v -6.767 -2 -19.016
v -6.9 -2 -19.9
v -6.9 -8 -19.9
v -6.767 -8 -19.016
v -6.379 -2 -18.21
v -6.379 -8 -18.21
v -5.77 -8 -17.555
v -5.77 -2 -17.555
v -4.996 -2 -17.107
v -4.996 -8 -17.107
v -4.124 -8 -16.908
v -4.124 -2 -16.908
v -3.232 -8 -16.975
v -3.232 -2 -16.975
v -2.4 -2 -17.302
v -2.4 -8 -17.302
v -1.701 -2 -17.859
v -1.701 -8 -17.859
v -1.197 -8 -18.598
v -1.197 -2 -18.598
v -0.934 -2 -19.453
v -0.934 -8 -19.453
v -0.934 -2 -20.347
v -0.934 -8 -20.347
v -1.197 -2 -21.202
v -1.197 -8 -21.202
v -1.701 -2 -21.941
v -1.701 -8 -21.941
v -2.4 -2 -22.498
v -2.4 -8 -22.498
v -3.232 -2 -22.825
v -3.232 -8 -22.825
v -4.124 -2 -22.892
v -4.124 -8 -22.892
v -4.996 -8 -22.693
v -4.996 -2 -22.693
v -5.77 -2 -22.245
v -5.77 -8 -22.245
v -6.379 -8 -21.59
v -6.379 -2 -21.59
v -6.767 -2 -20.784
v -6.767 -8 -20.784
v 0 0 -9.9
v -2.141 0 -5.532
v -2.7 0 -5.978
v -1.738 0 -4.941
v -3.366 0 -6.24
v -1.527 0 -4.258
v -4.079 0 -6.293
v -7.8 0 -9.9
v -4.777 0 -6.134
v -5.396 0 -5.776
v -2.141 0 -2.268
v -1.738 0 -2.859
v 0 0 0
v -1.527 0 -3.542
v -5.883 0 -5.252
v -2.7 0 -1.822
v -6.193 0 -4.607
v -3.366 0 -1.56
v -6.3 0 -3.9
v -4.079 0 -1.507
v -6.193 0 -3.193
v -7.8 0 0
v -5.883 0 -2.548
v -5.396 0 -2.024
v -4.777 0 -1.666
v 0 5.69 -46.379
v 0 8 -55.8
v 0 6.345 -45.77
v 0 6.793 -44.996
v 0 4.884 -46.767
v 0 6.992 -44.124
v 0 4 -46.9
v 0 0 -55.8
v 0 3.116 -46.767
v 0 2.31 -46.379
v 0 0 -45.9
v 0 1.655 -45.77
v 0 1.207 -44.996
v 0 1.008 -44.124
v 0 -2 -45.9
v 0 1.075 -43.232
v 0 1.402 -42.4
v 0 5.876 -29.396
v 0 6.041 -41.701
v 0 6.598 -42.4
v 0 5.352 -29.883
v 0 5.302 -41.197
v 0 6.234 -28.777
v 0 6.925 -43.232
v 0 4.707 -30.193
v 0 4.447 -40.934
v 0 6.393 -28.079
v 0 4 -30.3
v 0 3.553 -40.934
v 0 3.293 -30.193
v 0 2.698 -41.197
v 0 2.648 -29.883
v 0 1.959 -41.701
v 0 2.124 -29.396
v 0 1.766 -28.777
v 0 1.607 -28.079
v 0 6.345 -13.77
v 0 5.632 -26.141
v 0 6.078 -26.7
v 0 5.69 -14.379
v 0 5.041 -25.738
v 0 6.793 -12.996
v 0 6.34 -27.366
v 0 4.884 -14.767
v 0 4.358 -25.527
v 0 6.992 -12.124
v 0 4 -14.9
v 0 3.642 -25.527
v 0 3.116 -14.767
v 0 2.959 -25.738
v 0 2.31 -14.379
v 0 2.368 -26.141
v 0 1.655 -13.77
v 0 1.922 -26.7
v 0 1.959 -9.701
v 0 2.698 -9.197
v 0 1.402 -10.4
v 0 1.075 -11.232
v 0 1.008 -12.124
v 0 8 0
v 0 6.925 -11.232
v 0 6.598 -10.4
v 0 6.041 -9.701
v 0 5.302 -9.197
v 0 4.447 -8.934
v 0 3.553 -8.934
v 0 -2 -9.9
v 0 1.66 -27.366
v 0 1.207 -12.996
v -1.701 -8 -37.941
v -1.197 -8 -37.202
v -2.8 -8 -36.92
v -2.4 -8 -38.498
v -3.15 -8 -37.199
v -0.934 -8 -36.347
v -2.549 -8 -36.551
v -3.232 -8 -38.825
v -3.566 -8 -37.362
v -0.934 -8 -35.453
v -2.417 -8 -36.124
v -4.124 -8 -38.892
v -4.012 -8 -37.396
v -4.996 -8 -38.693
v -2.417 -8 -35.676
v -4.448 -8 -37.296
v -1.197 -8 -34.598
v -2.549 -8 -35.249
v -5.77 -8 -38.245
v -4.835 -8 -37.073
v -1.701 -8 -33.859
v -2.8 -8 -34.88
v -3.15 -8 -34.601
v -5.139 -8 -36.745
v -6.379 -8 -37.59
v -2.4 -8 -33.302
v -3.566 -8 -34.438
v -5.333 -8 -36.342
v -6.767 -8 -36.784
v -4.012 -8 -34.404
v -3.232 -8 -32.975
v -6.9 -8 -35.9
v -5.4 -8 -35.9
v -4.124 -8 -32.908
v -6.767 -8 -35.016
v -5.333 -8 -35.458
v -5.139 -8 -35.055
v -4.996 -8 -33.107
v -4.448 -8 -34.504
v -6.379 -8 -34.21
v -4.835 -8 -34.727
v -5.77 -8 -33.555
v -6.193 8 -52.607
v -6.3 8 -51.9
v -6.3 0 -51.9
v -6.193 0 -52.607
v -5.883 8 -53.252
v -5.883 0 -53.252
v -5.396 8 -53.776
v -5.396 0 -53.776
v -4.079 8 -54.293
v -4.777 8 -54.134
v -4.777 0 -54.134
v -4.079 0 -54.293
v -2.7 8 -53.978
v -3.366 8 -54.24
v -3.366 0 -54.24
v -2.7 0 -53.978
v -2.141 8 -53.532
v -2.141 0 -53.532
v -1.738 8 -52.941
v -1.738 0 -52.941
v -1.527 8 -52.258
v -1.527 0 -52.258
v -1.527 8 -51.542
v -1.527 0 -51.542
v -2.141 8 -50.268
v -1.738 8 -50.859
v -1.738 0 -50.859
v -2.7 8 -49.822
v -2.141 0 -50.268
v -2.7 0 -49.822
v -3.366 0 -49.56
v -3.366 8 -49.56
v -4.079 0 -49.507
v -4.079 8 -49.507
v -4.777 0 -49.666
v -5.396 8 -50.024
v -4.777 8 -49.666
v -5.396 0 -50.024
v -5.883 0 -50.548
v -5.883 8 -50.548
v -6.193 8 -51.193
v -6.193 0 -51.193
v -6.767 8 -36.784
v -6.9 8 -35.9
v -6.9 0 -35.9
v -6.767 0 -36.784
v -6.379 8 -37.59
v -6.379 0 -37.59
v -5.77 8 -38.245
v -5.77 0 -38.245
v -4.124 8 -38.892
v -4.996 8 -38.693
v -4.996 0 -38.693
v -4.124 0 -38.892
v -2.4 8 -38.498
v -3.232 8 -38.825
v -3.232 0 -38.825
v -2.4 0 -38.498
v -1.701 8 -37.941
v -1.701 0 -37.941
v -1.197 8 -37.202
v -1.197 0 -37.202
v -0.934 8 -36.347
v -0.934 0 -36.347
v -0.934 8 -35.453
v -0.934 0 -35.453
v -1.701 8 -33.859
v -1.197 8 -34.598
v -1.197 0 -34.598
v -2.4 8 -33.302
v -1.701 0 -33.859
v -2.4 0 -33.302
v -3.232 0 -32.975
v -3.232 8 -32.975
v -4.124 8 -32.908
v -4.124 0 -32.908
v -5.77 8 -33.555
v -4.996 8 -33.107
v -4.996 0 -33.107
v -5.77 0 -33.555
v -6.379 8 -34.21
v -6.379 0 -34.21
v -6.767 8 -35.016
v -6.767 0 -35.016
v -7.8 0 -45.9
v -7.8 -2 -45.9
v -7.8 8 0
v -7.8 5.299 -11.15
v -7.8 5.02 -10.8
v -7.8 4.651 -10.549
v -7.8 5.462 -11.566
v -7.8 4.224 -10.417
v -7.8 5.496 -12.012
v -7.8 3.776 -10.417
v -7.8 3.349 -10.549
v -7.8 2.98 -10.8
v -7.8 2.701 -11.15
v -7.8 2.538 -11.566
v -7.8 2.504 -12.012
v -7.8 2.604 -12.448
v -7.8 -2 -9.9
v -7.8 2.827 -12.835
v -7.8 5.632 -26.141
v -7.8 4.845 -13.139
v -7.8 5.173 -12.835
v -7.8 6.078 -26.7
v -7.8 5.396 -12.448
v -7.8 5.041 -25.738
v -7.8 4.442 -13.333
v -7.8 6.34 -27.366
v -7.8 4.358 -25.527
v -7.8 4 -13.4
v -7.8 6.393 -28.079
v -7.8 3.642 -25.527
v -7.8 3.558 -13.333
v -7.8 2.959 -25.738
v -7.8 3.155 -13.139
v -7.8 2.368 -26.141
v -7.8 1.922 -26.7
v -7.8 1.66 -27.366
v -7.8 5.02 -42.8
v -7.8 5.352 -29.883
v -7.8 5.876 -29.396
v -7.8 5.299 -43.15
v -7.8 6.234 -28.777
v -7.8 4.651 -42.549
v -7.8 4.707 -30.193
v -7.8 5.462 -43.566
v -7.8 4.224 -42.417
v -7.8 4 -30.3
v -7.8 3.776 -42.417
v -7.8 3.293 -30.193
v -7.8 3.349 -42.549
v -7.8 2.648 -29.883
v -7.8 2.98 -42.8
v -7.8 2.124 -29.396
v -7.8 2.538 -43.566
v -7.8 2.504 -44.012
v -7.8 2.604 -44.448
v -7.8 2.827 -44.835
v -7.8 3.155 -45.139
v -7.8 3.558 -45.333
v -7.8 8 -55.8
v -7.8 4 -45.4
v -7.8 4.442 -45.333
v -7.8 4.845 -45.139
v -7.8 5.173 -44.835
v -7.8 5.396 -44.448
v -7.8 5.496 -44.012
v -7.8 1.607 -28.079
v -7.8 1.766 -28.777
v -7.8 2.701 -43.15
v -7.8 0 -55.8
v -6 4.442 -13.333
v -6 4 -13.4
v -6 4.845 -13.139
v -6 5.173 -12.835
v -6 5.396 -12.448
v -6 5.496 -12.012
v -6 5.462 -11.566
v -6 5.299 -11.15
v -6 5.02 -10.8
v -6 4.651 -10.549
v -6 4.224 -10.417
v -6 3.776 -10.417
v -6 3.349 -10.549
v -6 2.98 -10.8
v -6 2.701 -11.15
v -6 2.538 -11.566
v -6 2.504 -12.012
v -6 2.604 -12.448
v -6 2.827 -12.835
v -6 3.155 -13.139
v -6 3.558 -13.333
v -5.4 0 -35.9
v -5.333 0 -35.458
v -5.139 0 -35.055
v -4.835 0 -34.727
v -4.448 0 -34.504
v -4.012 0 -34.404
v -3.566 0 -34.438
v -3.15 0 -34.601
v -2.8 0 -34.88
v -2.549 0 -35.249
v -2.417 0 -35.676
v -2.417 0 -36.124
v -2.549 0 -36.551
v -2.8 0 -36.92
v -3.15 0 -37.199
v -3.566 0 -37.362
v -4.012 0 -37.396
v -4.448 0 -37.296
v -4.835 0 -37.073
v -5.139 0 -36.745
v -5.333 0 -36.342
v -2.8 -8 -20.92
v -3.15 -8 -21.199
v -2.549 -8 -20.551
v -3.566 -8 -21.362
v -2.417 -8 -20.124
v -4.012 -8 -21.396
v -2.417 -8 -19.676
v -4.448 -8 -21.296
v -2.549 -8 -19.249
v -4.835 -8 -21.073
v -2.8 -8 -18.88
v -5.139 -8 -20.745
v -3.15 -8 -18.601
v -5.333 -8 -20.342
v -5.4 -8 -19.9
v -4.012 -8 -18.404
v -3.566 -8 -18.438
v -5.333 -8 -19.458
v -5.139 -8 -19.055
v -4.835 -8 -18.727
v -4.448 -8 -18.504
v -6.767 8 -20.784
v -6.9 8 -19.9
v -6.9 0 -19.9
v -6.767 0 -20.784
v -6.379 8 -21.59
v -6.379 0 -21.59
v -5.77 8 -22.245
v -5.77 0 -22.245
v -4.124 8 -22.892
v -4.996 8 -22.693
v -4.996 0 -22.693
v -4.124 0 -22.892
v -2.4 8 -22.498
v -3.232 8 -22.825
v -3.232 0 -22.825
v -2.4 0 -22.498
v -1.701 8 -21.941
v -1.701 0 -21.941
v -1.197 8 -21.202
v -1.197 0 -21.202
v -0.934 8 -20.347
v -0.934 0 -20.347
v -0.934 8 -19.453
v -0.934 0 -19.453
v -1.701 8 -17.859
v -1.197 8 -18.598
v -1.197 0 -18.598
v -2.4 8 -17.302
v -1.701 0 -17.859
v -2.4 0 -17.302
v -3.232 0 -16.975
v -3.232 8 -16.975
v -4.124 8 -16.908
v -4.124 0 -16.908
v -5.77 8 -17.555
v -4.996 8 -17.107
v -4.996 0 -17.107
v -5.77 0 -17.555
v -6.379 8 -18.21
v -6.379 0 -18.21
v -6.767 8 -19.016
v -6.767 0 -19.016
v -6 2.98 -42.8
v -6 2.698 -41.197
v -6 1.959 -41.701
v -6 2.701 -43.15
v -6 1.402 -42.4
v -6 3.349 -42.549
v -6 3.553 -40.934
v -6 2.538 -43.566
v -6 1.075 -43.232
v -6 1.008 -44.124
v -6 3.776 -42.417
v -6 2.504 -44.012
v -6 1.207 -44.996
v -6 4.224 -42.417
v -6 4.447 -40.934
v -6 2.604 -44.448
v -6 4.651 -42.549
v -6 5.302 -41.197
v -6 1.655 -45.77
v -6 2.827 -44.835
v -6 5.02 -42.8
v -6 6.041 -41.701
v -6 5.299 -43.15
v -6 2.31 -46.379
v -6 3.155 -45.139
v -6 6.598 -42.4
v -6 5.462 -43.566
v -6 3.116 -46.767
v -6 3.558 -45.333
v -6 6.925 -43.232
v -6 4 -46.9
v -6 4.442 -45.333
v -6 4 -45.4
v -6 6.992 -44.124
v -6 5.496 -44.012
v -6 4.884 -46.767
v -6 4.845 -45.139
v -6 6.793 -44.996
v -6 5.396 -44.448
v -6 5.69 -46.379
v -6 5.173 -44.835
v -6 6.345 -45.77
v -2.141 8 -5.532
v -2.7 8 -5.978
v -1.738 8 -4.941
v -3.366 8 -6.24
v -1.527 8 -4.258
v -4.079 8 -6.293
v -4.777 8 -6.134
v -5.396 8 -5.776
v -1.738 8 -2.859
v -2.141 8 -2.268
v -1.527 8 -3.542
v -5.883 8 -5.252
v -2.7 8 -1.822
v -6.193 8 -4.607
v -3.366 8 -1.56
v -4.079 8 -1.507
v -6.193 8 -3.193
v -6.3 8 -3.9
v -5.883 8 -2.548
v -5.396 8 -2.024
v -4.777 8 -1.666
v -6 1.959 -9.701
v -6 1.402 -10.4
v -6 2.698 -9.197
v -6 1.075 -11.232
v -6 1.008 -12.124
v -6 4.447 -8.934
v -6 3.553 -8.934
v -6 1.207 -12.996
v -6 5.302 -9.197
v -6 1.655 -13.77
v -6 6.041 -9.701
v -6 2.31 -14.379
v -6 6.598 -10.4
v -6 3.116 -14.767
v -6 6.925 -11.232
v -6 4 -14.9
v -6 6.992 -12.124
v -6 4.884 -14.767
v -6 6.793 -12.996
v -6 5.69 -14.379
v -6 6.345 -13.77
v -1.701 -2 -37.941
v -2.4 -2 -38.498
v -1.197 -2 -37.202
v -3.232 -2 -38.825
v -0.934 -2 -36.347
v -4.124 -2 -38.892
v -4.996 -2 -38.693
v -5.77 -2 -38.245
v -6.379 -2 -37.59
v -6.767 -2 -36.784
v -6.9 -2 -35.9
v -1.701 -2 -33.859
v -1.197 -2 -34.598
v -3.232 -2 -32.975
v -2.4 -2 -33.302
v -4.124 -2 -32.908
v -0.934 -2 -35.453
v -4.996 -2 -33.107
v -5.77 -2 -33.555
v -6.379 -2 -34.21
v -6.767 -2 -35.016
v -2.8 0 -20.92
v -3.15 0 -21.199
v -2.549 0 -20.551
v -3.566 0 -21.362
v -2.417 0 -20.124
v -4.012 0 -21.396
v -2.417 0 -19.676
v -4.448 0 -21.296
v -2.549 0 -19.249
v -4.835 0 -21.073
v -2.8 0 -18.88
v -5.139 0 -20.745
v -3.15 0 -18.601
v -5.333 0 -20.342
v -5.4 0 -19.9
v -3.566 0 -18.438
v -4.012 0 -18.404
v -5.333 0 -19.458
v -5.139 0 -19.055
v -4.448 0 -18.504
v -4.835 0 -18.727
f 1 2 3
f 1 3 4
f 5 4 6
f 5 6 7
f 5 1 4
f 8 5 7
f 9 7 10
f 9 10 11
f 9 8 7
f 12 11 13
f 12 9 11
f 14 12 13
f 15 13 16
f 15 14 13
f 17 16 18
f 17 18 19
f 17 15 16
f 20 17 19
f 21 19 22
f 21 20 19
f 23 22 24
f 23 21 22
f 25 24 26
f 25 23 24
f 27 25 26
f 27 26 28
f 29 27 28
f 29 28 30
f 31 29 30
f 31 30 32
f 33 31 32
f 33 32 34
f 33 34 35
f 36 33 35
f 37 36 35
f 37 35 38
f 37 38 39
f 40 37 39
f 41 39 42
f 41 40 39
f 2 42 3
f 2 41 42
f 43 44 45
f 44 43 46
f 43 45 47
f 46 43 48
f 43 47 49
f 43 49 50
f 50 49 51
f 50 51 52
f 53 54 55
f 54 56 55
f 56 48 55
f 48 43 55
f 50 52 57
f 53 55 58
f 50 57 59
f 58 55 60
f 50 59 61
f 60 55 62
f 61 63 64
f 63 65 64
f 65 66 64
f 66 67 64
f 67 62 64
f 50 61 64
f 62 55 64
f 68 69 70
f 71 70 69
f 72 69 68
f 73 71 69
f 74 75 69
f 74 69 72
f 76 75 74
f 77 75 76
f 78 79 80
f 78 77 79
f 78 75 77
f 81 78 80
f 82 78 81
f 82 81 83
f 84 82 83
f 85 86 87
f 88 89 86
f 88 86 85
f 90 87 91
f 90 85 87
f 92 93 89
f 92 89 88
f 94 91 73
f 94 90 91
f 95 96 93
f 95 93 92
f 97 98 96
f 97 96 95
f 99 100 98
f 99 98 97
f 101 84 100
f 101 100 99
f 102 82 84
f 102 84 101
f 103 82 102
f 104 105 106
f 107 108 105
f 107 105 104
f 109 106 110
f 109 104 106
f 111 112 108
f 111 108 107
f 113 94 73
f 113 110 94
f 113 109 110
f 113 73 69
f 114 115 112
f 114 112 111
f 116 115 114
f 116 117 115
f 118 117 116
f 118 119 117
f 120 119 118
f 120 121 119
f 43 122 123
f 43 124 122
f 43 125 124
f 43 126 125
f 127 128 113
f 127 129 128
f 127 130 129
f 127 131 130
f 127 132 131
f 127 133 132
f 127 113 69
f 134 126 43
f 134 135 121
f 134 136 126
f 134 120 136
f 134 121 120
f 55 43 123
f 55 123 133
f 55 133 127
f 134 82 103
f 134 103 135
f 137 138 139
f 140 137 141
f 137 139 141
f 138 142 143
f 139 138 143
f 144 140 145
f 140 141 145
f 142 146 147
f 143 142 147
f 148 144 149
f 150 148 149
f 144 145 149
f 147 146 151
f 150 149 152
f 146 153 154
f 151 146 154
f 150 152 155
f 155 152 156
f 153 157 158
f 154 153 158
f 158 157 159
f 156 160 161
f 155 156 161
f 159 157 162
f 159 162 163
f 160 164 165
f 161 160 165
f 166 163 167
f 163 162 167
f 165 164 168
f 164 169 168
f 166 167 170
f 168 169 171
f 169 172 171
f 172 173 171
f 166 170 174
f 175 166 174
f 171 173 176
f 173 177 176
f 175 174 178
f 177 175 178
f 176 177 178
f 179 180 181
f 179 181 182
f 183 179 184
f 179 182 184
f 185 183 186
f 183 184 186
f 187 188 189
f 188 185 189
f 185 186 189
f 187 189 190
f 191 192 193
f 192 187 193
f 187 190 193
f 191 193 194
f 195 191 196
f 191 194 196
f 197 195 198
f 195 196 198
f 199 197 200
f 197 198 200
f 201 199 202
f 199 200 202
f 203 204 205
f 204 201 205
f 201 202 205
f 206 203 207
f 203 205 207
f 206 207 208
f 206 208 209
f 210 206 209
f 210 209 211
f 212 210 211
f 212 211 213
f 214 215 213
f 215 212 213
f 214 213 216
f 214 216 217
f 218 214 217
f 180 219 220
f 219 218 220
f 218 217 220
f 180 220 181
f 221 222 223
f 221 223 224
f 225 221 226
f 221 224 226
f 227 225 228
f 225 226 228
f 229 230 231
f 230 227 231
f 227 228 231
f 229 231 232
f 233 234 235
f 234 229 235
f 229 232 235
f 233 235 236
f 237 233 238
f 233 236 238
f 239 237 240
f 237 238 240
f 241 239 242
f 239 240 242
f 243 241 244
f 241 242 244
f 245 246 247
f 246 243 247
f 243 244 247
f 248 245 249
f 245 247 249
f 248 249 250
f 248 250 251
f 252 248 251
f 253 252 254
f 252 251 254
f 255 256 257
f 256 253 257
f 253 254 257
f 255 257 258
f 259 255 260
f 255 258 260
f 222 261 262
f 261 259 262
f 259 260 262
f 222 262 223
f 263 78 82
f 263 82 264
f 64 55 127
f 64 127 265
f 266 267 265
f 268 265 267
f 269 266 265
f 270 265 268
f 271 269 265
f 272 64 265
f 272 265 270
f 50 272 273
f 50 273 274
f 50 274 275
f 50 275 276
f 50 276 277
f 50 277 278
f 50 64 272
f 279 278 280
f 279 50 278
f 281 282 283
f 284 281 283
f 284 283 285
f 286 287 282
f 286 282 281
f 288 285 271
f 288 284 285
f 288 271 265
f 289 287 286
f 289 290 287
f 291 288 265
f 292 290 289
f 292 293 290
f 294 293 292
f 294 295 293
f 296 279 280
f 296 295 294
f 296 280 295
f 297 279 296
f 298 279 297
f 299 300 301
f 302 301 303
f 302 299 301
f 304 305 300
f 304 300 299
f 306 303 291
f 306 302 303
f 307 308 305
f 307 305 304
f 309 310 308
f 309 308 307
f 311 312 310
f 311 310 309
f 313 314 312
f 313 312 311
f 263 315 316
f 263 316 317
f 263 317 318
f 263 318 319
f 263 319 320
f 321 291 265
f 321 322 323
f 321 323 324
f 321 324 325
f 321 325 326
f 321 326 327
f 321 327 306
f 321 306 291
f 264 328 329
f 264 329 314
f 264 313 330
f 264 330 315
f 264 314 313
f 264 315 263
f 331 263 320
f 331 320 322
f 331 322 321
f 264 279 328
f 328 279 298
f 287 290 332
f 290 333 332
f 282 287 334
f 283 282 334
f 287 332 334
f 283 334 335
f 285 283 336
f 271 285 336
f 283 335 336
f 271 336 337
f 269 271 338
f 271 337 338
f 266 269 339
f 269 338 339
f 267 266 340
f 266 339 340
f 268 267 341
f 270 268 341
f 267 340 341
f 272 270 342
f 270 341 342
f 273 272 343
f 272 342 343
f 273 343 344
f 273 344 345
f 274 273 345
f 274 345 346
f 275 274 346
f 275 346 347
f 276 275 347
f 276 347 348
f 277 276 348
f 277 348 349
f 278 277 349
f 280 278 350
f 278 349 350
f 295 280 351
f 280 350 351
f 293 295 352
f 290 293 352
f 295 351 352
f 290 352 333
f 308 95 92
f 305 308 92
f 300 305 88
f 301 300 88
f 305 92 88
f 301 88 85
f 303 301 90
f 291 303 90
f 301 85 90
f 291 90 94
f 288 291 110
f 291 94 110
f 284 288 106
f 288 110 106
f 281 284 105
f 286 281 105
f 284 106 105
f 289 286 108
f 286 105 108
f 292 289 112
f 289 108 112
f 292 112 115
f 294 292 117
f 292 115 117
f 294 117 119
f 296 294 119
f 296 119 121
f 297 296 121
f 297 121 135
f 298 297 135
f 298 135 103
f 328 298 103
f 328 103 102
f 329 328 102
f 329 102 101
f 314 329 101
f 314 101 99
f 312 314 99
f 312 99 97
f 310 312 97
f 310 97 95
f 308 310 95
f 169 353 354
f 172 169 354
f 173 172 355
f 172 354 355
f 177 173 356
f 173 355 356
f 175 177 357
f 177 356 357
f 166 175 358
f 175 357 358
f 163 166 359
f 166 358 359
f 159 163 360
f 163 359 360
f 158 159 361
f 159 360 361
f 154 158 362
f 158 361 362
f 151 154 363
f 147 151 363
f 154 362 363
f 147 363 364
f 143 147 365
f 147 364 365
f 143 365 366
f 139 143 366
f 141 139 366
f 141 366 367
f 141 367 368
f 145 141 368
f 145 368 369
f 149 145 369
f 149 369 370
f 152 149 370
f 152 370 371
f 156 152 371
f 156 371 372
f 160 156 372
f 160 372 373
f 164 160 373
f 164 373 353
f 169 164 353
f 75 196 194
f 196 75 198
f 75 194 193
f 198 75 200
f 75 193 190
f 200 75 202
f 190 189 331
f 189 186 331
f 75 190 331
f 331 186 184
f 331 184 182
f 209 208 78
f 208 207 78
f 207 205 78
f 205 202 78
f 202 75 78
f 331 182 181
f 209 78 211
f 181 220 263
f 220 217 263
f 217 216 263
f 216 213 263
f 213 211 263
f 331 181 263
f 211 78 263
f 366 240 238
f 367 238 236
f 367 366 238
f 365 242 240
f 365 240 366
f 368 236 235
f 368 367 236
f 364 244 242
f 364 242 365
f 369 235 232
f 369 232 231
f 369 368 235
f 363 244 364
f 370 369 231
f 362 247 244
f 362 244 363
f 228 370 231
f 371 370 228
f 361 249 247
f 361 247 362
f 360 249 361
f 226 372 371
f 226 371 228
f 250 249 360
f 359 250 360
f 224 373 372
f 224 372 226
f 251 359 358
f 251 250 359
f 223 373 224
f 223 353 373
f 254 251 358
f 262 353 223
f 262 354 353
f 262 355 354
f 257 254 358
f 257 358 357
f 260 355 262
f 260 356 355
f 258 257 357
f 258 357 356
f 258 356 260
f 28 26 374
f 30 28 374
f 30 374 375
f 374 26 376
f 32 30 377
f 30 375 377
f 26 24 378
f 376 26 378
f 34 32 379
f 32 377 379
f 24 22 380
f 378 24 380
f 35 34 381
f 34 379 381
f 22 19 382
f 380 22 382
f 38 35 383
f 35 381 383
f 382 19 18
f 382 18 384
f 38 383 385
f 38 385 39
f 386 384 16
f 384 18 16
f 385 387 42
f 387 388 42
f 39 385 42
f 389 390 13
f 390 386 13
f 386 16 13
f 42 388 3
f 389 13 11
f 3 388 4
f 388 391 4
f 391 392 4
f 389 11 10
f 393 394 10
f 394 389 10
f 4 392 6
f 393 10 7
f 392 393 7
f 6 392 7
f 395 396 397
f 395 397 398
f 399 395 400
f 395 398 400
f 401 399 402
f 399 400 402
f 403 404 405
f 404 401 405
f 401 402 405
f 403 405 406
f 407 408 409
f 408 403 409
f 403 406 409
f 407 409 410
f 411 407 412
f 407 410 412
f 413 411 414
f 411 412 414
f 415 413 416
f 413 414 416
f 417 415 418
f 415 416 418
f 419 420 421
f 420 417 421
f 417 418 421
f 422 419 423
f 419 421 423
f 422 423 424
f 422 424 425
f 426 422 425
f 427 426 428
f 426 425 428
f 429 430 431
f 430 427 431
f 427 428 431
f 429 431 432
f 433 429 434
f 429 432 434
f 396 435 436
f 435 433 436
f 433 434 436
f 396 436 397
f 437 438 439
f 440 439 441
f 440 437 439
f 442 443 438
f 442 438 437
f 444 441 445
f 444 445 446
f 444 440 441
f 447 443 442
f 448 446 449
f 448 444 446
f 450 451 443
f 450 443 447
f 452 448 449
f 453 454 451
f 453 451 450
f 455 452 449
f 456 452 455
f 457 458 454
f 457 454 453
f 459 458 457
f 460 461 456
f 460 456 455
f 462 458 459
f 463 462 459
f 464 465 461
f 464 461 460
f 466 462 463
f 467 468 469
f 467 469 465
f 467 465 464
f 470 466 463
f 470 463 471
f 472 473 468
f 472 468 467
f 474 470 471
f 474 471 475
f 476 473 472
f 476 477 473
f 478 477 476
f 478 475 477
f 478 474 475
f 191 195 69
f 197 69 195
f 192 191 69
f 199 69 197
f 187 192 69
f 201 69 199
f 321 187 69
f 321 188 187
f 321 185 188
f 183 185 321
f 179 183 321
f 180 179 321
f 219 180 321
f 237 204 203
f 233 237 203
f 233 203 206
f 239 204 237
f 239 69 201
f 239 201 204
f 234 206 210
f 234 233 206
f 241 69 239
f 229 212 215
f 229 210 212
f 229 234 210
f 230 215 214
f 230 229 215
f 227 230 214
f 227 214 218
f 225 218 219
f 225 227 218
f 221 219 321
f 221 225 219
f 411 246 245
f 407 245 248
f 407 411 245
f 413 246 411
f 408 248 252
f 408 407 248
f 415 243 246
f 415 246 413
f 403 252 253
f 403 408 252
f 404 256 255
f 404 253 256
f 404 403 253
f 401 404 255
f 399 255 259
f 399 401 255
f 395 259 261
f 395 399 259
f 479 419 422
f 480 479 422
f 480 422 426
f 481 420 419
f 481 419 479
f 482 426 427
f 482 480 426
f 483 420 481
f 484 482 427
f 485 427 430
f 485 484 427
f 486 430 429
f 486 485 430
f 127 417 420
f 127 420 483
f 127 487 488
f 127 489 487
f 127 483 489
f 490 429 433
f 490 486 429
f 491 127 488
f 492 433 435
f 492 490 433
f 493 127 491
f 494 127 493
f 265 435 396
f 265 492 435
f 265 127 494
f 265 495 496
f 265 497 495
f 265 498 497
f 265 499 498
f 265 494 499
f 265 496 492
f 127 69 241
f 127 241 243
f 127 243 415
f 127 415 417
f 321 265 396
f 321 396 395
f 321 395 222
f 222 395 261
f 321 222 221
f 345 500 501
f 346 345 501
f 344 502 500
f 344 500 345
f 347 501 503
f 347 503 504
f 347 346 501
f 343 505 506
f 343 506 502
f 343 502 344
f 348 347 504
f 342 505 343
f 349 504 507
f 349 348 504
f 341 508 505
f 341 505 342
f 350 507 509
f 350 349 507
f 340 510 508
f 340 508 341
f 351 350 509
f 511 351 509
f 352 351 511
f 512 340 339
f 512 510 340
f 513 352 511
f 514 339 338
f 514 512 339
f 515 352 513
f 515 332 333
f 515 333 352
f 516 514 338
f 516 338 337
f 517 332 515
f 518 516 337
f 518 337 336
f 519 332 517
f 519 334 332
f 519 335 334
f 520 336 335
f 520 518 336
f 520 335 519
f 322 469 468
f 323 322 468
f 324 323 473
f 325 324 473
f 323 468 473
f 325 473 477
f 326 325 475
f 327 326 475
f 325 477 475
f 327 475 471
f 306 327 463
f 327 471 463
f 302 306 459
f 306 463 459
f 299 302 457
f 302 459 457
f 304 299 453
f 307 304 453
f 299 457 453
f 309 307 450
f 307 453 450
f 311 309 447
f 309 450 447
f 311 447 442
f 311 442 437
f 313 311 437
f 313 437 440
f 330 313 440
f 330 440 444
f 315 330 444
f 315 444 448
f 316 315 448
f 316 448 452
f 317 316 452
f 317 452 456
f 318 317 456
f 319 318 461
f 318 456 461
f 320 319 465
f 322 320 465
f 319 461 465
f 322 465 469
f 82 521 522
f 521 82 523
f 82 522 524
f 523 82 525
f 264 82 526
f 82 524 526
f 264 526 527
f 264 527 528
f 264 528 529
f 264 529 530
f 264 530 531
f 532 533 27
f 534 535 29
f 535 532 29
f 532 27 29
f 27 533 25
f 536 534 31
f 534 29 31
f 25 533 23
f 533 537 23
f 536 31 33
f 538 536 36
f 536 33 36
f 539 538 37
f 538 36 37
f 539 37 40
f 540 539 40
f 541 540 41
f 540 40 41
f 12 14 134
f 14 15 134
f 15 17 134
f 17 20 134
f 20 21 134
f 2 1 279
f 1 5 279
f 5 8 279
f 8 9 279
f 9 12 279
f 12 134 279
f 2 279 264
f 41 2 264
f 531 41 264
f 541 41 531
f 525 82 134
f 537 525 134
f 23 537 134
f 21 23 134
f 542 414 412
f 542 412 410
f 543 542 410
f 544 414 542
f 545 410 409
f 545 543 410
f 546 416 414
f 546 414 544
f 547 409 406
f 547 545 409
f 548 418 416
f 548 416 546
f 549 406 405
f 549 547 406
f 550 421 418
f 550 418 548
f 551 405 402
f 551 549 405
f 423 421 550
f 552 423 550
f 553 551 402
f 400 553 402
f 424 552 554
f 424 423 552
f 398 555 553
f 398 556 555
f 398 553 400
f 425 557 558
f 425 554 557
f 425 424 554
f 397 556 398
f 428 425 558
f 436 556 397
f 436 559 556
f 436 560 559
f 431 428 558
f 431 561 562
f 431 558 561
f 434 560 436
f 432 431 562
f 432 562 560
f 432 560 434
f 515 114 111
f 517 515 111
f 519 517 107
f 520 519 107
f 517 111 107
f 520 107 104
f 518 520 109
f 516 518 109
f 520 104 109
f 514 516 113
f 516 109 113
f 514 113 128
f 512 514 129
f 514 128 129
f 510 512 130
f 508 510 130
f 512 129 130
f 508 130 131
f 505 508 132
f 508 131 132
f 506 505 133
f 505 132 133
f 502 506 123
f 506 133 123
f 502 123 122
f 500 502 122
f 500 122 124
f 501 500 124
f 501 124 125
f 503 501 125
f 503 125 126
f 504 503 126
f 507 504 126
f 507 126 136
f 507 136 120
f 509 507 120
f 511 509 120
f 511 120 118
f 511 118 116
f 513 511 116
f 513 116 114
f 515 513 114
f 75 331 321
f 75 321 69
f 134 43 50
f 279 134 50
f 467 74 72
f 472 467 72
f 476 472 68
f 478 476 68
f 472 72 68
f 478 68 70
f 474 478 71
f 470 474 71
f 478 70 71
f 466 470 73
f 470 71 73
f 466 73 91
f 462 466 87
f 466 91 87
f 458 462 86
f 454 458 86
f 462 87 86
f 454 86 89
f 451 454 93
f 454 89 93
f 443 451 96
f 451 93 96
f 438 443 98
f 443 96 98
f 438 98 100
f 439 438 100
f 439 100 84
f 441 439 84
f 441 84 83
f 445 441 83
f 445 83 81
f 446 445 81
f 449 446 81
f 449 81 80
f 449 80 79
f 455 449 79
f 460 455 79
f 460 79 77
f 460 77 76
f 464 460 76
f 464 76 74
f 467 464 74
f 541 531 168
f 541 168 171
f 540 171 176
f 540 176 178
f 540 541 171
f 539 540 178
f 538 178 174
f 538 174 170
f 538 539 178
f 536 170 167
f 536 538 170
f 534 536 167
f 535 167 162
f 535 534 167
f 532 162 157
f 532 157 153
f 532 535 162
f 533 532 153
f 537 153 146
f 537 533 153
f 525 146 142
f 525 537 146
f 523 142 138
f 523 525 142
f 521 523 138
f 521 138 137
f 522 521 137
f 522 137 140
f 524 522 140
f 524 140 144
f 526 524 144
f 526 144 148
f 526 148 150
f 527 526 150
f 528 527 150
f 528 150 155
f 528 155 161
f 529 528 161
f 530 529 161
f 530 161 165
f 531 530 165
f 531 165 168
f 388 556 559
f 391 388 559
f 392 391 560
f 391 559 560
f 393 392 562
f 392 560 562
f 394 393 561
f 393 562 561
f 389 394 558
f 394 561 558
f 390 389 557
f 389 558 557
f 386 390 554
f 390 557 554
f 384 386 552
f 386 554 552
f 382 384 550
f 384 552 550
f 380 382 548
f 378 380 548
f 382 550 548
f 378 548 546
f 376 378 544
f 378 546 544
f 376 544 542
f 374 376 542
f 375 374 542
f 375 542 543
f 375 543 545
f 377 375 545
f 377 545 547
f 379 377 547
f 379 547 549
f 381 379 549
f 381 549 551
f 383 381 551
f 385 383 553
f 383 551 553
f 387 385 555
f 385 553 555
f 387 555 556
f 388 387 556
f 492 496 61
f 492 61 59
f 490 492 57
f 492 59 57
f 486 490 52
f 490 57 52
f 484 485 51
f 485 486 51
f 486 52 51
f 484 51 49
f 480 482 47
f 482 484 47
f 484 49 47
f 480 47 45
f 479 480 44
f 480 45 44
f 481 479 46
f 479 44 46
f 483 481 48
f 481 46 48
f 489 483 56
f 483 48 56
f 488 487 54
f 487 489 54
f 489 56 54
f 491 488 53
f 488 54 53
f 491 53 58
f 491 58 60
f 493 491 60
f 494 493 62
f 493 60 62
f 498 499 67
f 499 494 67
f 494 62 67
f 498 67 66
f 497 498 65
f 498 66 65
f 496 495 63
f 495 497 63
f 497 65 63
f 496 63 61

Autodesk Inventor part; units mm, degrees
ref_plane "YZ Plane" through (0, 0, 0) normal (1, 0, 0) x (0, 1, 0)
ref_plane "XZ Plane" through (0, 0, 0) normal (0, 1, 0) x (-1, 0, 0)
ref_plane "XY Plane" through (0, 0, 0) normal (0, 0, 1) x (1, 0, 0)
sketch "Sketch1" plane through (0, 0, 0) normal (0, 1, 0) x (-1, 0, 0)
  line L0 (0, 0) -> (7.8, 0)
  line L1 (7.8, 0) -> (7.8, -55.8)
  line L2 (7.8, -55.8) -> (0, -55.8)
  line L3 (0, -55.8) -> (0, 0)
  line L4 (3.9, 0) -> (3.9, -55.8) construction
  line L5 (7.8, -27.9) -> (0, -27.9) construction
  circle A0 centre (3.9, -19.9) radius 3
  circle A1 centre (3.9, -19.9) radius 1.5
  circle A2 centre (3.9, -35.9) radius 3
  circle A3 centre (3.9, -35.9) radius 1.5
  circle A4 centre (3.9, -3.9) radius 2.4
  circle A5 centre (3.9, -51.9) radius 2.4
  line L6 (0, -9.9) -> (7.8, -9.9)
  line L7 (0, -45.9) -> (7.8, -45.9)
  dimension "d0" = 7.8
  dimension "d1" = 55.8
  dimension "d3" = 6
  dimension "d4" = 3
  dimension "d25" = 8
  dimension "d26" = 4.8
  dimension "d27" = 16
  dimension "d28" = 18
extrude "Extrusion1" add sketch "Sketch1" along normal blind 8 contours L0 L1 L6 L3 | L6 L1 L7 L3 | L7 L1 L2 L3
extrude "Extrusion2" add sketch "Sketch1" against normal blind 2 contours L6 L1 L7 L3 | A0 | A2
extrude "Extrusion3" add sketch "Sketch1" against normal blind 6 from surface at -2 contours A0 | A2
sketch "Sketch2" plane through (0, 8, 0) normal (1, 0, 0) x (0, 0, -1)
  line L0 (0, 0) -> (55.8, 0) construction
  line L1 (0, -8) -> (0, 0) construction
  line L2 (45.9, -10) -> (9.9, -10) construction
  line L3 (55.8, 0) -> (55.8, -10) construction
  line L4 (27.9, 0) -> (27.9, -10) construction
  line L5 (9.9, -10) -> (45.9, -10) construction
  circle A0 centre (27.9, -4) radius 2.4
  line L6 (55.8, 0) -> (0, 0) projected
  line L7 (11.9, 0) -> (11.9, -10) construction
  circle A1 centre (11.9, -4) radius 1.5
  circle A2 centre (11.9, -4) radius 3
  circle A3 centre (43.9, -4) radius 1.5
  circle A4 centre (43.9, -4) radius 3
  point P0 (0, -10)
  dimension "d11" = 4
  dimension "d12" = 4.8
  dimension "d17" = 4
  dimension "d18" = 3
  dimension "d19" = 6
  dimension "d22" = 16
extrude "Extrusion4" cut sketch "Sketch2" against normal through all contours A0
extrude "Extrusion5" cut sketch "Sketch2" against normal blind 6 contours A1 | A2 | A3 | A4
extrude "Extrusion6" cut sketch "Sketch2" against normal through all contours A1 | A3
properties part number "diff_gear_holder_4"
